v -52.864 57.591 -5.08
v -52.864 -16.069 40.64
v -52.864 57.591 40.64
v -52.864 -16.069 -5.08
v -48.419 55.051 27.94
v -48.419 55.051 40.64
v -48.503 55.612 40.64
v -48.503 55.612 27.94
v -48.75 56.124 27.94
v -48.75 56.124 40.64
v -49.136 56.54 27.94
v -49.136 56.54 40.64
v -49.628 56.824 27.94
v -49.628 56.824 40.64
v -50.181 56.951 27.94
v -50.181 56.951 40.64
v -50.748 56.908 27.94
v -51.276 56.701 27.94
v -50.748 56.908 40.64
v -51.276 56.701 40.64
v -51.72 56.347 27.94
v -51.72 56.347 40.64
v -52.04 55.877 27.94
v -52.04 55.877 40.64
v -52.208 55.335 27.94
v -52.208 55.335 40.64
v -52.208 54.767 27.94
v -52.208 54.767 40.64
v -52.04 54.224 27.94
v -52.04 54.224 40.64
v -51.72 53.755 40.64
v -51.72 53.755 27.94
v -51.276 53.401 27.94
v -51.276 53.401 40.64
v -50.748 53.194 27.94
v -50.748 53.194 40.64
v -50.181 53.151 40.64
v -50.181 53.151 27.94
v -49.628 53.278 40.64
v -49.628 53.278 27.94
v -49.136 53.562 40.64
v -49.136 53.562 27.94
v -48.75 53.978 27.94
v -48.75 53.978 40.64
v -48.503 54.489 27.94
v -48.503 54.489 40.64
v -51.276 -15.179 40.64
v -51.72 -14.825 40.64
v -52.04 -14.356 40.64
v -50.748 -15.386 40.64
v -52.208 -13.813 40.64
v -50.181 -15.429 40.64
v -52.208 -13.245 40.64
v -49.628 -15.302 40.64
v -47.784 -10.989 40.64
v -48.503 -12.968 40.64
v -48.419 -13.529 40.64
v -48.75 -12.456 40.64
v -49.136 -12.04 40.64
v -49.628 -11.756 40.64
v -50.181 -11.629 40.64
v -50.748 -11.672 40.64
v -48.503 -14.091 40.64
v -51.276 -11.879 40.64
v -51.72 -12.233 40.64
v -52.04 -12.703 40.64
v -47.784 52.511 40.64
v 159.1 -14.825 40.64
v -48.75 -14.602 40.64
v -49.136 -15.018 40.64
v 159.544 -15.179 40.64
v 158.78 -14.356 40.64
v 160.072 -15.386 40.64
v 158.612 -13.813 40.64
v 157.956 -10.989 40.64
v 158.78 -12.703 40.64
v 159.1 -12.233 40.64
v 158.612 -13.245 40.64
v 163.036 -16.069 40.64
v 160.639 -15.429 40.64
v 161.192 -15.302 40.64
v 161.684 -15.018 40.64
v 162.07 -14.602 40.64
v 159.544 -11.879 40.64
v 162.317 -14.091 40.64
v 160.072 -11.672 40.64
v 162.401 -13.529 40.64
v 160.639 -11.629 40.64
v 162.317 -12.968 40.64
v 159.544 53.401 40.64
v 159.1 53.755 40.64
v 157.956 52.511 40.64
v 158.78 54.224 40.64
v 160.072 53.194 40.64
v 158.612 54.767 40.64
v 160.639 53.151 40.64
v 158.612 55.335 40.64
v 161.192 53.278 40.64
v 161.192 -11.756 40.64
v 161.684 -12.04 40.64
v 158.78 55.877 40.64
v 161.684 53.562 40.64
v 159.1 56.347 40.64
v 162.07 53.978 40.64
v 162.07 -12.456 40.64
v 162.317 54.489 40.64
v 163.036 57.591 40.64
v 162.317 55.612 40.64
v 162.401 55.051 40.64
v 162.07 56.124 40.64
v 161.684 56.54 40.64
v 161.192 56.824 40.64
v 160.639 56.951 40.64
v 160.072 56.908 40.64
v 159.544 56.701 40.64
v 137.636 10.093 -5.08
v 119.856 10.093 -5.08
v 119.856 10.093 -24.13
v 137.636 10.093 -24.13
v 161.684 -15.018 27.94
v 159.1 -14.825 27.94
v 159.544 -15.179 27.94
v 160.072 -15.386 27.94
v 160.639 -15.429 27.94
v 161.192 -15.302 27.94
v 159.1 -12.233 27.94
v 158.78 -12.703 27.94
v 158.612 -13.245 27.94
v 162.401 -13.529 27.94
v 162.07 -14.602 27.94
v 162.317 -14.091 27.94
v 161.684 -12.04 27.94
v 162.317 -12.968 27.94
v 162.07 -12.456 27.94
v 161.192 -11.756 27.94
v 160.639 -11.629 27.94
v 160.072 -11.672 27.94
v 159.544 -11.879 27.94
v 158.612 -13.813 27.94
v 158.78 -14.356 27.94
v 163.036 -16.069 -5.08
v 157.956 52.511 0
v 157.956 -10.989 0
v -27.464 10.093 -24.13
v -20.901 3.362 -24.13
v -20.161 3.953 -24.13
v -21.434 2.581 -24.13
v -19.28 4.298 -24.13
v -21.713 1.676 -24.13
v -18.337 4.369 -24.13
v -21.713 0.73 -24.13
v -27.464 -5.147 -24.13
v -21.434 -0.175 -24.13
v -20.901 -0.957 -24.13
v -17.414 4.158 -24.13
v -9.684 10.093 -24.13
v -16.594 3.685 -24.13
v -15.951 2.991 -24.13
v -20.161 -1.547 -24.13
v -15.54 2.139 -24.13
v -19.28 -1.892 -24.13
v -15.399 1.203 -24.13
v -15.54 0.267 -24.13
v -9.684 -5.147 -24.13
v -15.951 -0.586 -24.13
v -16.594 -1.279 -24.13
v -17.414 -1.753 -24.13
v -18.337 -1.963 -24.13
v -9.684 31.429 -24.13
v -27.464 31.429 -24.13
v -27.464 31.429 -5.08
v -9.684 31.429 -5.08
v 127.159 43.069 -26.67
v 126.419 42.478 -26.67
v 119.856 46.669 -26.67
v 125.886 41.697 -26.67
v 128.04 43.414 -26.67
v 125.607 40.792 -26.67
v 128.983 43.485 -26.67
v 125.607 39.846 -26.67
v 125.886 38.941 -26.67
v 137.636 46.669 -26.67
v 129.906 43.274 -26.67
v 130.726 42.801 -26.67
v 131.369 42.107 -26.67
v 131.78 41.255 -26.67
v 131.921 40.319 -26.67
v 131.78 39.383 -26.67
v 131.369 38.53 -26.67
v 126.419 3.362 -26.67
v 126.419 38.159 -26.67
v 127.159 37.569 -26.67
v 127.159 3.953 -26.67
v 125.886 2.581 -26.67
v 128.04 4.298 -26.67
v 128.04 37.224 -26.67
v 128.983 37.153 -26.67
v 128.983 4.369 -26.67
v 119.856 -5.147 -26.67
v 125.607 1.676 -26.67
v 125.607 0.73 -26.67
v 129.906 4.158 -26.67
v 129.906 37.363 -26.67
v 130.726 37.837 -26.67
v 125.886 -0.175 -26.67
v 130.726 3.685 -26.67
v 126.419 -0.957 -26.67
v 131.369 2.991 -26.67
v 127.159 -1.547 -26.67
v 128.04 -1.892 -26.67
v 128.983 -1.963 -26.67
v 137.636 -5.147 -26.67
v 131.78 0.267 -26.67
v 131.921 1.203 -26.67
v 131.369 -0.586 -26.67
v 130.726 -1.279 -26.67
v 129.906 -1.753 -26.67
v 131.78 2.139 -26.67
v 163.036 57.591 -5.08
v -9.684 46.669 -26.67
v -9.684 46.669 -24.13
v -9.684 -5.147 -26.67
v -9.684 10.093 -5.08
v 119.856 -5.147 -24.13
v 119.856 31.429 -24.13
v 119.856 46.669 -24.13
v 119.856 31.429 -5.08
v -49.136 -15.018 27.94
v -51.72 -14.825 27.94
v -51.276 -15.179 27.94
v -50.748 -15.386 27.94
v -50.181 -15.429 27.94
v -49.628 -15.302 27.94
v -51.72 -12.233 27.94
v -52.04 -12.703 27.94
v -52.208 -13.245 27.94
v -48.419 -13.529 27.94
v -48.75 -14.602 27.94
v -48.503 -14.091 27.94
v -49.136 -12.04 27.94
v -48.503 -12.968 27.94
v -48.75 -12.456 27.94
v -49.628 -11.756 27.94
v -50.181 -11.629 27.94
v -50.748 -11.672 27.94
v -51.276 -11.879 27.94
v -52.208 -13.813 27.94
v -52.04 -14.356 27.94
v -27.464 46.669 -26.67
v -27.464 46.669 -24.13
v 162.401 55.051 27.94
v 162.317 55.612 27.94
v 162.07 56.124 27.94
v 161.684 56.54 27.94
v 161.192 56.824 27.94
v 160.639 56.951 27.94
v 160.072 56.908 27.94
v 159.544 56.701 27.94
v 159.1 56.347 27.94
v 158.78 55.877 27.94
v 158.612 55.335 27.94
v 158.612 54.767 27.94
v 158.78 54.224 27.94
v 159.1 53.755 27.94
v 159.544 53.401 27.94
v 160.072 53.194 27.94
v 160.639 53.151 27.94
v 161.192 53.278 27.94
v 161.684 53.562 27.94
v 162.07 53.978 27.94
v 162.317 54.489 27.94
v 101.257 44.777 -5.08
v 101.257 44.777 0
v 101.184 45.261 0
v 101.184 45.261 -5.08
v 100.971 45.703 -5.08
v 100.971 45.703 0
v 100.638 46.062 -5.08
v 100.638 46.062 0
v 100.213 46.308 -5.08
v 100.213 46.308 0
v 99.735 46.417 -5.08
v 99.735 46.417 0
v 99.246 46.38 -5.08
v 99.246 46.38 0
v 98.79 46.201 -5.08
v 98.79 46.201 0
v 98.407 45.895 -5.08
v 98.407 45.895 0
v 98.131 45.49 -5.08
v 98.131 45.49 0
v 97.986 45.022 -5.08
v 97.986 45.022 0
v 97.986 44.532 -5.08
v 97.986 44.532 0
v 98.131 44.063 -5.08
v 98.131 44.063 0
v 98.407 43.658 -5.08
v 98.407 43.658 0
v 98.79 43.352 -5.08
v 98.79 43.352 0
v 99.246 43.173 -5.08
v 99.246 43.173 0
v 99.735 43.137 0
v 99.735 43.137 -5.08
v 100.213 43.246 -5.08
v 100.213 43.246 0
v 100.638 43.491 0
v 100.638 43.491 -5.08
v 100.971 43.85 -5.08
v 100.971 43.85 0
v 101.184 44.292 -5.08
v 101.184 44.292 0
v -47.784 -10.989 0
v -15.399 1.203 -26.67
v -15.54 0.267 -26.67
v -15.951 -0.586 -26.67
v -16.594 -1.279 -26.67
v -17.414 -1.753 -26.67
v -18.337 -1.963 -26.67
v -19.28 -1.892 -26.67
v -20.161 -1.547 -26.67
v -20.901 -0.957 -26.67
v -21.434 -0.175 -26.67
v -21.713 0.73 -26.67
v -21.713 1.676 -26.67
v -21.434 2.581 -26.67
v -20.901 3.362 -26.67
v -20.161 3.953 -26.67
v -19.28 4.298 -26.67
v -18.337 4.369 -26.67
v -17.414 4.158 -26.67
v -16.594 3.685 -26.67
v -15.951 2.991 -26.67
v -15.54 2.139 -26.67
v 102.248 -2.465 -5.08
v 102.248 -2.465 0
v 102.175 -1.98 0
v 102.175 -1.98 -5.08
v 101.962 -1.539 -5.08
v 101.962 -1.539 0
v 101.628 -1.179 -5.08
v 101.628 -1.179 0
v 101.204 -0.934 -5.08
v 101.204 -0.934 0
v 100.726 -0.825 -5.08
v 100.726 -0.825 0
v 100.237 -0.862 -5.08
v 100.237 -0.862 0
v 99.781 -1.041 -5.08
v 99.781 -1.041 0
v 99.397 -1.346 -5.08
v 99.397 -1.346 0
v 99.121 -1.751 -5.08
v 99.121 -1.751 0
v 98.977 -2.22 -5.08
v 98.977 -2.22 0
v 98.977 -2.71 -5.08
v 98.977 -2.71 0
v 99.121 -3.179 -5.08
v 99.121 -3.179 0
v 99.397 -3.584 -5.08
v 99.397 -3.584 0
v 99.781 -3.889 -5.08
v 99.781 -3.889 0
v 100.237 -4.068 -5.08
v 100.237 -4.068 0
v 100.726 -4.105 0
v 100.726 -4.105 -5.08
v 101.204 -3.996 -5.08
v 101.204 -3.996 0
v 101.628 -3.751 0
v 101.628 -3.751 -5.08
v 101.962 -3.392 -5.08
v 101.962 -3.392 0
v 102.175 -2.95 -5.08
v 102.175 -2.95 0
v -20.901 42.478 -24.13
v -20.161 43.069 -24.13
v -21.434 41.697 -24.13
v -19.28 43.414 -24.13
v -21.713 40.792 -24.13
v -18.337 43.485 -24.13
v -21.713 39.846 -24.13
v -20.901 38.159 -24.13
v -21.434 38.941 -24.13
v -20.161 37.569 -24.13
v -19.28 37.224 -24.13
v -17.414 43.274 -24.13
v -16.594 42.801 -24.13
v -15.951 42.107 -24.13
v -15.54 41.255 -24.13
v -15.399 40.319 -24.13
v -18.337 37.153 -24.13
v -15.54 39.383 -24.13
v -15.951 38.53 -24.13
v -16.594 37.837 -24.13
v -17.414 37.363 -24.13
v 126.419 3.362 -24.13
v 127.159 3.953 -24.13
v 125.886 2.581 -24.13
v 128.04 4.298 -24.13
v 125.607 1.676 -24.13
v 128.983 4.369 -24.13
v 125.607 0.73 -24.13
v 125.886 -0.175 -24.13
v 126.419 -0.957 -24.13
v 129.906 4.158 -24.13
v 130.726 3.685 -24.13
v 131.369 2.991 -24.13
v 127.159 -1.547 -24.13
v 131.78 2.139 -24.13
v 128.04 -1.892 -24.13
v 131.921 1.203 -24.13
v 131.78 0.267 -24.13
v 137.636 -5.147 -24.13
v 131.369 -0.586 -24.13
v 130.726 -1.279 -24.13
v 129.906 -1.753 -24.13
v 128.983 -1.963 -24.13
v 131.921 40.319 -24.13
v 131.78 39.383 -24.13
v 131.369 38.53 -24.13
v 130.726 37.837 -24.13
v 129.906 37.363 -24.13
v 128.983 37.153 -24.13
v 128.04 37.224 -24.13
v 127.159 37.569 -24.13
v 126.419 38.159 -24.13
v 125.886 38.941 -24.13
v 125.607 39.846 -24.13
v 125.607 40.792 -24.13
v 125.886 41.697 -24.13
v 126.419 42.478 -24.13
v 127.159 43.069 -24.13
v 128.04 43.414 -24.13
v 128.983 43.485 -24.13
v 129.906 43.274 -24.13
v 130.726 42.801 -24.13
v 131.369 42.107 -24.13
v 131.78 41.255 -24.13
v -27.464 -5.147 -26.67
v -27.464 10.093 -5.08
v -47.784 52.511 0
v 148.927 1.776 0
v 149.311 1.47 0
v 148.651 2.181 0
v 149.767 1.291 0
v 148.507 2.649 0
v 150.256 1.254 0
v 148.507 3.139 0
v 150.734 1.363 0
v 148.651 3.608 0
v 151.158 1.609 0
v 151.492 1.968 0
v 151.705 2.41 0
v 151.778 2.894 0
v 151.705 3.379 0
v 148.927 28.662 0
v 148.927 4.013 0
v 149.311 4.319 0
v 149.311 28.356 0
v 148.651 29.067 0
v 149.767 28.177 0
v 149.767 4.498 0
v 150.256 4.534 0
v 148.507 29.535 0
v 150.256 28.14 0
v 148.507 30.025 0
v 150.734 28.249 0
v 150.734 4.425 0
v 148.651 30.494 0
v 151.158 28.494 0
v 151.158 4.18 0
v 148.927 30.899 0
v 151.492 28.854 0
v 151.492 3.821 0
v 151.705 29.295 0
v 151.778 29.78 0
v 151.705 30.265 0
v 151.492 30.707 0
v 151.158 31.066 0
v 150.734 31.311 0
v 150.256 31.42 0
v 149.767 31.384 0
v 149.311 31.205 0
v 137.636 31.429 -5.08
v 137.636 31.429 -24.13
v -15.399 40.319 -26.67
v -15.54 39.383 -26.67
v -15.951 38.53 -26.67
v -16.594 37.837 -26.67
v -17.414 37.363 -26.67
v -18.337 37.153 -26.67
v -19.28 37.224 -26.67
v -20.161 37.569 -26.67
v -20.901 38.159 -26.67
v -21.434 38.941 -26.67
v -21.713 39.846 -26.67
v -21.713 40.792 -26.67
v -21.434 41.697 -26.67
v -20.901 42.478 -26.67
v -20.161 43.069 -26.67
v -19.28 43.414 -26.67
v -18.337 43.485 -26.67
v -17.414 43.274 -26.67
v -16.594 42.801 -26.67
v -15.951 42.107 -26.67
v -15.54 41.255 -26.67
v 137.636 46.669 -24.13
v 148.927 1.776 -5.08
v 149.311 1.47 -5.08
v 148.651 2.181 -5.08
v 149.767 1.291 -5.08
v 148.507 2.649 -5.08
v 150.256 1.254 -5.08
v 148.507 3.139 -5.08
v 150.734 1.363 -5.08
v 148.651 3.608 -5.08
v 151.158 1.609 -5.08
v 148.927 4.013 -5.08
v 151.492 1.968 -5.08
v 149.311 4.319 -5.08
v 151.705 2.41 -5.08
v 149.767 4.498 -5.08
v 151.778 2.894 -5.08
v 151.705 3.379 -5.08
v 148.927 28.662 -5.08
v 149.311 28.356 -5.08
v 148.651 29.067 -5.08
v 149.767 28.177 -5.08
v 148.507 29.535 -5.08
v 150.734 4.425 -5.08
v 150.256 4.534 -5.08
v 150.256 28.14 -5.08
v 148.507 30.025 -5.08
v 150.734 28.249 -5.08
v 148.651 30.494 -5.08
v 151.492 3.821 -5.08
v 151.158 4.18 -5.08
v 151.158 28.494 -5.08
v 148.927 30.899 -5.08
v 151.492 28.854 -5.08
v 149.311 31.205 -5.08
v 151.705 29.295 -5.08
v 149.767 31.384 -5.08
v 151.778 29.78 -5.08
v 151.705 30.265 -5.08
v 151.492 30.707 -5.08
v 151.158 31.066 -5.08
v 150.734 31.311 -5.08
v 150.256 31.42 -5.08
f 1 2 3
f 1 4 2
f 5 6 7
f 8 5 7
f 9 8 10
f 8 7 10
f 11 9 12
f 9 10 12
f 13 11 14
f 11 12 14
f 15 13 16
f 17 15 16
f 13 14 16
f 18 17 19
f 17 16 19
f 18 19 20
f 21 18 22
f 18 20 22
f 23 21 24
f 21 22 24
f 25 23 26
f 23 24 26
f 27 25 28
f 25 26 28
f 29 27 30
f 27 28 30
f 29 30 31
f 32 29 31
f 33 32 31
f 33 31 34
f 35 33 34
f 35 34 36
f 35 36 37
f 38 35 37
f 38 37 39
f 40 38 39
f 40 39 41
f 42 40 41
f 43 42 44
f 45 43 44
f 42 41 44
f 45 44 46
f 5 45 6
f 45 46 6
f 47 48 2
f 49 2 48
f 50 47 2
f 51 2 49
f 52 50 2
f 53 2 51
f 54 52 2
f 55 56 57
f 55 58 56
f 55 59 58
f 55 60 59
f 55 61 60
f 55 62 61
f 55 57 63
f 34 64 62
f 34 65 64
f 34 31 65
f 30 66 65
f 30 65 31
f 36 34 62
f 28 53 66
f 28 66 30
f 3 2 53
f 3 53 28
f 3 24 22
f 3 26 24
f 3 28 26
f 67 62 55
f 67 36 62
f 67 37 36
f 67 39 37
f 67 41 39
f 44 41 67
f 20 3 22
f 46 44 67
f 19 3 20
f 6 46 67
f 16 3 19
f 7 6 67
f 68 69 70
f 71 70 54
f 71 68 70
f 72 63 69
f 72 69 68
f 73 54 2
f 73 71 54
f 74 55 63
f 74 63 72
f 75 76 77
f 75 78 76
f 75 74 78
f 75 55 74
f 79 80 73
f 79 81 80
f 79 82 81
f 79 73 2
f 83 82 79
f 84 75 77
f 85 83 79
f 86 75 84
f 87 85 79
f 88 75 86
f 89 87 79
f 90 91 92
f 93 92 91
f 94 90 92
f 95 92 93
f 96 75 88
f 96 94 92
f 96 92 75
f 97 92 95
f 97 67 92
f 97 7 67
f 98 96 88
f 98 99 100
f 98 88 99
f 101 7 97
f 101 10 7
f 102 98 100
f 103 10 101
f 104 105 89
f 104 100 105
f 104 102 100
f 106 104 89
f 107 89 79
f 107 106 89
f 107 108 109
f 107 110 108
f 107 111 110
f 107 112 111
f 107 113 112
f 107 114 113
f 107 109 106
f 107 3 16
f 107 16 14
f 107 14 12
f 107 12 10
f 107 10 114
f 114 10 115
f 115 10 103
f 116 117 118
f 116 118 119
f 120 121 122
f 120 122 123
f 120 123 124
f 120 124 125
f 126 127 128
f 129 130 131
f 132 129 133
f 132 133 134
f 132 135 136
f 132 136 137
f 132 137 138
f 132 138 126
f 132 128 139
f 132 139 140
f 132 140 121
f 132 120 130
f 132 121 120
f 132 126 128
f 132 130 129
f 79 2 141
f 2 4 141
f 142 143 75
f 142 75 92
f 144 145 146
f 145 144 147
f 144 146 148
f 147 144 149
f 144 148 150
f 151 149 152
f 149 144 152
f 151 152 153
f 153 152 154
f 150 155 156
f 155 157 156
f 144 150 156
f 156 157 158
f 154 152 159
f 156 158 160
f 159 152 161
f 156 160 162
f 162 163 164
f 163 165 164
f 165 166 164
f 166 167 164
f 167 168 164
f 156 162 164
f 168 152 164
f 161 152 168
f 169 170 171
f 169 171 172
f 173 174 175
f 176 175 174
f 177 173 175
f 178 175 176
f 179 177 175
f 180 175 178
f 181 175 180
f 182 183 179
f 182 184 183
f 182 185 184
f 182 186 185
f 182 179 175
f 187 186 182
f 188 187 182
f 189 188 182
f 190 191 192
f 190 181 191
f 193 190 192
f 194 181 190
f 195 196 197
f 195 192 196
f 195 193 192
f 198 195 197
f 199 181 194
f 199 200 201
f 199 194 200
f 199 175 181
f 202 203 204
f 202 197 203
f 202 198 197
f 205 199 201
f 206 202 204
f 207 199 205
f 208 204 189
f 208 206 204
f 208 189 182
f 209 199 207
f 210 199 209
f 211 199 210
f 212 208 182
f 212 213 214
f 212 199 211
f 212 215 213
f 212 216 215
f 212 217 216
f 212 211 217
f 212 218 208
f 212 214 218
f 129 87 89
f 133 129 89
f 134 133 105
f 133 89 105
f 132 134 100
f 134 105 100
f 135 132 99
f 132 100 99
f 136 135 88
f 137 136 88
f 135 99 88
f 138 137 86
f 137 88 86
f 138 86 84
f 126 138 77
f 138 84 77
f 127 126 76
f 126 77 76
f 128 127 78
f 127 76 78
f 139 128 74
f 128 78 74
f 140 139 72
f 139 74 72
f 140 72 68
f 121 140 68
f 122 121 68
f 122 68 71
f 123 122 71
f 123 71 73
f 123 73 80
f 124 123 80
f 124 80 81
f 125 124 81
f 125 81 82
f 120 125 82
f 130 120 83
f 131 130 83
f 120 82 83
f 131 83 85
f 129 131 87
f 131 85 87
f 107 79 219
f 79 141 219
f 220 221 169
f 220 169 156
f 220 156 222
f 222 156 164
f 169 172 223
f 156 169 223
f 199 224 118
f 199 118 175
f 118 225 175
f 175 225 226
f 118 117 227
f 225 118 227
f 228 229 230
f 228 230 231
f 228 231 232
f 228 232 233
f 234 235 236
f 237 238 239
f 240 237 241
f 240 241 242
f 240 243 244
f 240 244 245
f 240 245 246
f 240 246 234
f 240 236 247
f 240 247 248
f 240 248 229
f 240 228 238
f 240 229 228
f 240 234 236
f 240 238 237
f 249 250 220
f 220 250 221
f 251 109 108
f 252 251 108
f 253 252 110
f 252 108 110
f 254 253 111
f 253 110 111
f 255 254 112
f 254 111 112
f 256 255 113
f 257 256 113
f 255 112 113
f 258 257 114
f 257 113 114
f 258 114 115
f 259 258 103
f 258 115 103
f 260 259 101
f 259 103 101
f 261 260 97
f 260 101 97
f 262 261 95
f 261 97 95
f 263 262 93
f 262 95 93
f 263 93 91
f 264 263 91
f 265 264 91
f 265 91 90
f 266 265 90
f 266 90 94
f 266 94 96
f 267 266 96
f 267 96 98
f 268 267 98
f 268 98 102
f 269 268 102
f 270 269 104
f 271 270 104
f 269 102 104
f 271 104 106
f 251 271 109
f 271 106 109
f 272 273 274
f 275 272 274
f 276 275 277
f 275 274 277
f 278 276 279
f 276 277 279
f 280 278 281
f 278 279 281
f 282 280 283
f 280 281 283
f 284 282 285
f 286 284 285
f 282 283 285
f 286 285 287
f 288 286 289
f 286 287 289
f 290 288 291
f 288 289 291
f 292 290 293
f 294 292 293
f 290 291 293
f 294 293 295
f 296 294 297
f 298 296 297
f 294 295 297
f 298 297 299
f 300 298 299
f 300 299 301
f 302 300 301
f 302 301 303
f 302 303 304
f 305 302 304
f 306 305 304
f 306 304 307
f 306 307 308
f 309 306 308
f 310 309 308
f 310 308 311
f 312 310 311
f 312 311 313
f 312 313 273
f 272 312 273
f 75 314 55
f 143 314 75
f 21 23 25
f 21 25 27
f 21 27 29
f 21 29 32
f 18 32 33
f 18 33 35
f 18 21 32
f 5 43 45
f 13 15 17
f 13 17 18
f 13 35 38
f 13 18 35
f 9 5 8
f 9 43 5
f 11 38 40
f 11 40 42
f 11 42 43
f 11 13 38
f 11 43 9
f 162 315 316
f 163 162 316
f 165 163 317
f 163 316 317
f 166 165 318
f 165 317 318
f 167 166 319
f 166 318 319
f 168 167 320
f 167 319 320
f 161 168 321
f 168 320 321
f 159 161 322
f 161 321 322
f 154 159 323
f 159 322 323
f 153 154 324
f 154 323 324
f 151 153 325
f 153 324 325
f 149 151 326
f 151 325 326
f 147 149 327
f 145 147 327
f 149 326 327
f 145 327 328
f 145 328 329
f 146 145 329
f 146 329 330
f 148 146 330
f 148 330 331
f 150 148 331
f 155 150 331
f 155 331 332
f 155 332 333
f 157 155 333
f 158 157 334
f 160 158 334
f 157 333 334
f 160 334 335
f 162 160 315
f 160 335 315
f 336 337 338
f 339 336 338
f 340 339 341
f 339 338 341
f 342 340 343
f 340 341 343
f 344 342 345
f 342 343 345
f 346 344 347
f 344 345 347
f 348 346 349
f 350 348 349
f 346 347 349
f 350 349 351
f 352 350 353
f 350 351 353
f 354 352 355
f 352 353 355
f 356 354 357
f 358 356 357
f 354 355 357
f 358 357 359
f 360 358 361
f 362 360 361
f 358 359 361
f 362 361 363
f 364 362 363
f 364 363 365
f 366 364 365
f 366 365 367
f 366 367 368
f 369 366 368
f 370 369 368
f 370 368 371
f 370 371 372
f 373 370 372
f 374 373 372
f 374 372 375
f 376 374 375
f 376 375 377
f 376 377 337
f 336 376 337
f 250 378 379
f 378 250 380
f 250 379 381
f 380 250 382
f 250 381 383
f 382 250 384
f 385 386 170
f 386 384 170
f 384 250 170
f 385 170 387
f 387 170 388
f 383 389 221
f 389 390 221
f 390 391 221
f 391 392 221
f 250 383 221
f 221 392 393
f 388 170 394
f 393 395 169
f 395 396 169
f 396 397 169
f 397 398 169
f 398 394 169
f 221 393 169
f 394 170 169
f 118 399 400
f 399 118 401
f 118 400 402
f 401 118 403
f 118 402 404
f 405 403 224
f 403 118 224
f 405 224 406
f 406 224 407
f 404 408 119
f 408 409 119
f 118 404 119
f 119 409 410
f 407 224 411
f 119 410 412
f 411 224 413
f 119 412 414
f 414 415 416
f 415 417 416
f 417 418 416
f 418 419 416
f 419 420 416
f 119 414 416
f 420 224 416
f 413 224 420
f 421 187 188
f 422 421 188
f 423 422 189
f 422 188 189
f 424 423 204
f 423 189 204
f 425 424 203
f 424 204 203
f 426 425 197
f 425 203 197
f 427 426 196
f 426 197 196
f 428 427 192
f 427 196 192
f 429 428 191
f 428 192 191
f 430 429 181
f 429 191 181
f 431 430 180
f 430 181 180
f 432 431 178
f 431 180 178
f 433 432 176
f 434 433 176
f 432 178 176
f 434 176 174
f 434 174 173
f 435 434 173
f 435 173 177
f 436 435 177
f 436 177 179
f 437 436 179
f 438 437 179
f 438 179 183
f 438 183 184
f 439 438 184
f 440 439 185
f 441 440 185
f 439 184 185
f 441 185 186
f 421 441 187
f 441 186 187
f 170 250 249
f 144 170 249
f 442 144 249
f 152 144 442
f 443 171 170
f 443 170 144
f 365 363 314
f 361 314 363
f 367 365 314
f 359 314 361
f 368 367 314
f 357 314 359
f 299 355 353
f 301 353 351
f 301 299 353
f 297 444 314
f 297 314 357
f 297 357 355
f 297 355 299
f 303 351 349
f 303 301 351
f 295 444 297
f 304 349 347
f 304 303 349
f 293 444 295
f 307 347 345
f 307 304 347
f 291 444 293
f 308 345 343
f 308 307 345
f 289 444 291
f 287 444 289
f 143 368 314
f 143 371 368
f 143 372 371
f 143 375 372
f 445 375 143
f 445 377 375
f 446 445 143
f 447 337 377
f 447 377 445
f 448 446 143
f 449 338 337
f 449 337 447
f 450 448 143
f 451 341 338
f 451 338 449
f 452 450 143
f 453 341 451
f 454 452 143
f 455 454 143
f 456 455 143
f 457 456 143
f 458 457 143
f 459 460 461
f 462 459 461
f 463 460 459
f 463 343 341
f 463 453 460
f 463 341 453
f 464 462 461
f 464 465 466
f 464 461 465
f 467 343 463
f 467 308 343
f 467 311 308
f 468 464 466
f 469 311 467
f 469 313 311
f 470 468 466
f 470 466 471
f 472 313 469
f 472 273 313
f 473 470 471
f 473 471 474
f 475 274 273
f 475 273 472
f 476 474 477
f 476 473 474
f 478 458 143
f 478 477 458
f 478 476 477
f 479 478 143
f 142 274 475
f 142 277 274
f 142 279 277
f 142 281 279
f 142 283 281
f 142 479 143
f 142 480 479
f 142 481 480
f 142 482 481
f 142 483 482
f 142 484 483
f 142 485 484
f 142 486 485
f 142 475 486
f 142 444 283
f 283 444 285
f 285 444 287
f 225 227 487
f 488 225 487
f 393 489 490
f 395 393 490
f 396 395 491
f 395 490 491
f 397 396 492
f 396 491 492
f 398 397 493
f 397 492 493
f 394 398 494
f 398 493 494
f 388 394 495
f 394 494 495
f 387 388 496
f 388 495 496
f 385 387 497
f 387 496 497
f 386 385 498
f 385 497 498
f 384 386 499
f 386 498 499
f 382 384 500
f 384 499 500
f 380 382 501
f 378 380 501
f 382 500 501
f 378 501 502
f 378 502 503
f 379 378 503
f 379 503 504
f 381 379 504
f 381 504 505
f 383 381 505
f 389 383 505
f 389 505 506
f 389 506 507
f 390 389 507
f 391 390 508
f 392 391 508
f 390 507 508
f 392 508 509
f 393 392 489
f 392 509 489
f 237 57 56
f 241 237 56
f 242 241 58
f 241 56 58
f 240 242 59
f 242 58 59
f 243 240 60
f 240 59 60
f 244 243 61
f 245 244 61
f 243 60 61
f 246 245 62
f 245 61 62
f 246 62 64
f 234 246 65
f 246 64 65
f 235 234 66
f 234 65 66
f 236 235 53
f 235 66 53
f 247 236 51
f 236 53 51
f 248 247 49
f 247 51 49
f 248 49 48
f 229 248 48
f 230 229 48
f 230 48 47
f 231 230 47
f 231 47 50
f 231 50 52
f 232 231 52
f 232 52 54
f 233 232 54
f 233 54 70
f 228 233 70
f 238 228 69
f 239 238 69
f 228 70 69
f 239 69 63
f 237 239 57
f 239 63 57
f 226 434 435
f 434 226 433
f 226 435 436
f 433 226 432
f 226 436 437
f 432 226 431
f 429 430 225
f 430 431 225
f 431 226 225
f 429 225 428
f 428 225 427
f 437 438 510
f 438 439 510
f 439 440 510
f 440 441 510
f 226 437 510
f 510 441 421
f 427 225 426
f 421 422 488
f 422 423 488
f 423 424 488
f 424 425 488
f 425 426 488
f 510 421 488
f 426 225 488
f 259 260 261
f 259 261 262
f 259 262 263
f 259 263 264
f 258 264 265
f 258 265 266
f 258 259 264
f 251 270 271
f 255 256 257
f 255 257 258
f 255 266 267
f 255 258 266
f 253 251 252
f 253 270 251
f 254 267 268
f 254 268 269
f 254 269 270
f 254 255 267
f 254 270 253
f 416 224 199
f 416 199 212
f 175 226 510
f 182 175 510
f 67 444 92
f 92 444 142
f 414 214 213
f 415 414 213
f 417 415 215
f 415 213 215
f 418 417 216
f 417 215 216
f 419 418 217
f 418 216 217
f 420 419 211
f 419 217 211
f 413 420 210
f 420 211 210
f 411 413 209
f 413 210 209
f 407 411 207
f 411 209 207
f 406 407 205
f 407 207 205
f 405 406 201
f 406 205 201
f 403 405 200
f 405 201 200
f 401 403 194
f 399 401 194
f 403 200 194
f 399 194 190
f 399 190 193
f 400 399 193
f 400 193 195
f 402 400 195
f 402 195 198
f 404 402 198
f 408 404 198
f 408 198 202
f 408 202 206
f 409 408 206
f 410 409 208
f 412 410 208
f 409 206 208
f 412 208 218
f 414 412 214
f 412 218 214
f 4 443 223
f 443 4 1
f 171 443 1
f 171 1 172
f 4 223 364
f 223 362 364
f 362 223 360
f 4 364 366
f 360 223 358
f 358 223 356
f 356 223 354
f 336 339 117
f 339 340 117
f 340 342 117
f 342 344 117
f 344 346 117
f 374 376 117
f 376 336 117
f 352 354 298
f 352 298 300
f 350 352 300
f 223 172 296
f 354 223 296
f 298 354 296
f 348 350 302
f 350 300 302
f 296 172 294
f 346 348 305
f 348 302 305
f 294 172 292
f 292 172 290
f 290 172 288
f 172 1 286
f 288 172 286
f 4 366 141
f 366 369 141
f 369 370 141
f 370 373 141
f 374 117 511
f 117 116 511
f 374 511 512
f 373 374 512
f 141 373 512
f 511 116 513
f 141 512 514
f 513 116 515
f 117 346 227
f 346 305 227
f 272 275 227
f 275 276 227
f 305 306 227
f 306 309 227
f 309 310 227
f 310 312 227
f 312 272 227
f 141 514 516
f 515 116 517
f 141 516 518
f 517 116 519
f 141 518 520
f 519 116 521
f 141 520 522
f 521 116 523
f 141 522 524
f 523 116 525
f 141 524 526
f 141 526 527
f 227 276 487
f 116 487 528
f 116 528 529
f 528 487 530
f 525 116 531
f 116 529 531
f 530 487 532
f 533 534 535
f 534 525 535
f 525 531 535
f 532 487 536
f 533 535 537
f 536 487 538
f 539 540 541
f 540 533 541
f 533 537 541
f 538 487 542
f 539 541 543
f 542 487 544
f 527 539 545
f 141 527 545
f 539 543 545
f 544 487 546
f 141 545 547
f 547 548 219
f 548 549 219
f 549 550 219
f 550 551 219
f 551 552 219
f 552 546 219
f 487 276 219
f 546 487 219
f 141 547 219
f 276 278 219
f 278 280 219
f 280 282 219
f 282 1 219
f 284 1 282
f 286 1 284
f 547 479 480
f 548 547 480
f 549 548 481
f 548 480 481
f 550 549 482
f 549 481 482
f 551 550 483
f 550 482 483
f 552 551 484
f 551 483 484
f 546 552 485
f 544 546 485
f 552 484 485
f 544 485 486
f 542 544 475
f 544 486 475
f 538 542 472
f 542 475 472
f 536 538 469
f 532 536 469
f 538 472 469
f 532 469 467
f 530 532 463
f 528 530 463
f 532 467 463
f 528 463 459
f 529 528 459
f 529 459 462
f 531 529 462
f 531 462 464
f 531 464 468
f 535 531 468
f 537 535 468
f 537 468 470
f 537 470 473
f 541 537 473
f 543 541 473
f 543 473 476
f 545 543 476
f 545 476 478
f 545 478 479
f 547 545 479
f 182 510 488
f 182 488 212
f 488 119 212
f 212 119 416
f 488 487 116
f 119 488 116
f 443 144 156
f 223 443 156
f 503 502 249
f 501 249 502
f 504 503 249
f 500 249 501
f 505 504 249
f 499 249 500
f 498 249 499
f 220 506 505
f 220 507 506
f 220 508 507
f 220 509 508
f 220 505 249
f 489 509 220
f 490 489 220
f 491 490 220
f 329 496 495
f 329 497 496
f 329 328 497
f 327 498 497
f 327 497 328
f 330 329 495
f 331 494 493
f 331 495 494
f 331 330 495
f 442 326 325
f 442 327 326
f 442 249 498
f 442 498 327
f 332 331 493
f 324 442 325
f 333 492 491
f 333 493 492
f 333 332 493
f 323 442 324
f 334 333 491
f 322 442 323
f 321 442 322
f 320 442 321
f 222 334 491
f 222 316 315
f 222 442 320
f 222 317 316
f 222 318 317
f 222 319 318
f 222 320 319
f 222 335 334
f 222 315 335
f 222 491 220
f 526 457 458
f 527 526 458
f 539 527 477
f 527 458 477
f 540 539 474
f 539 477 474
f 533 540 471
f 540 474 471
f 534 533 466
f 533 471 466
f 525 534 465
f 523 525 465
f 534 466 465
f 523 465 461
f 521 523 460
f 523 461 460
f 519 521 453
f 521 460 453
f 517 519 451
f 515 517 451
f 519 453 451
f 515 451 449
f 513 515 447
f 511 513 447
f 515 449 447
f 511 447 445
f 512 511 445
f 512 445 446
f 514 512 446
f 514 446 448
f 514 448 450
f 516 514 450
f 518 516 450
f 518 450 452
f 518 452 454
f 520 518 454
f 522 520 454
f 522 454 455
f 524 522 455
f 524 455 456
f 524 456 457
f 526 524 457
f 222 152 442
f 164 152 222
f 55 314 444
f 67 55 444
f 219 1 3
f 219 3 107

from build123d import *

# Parameters (mm, degrees)
F0_W      = 215.9
F0_H      = 73.66
F0_W_2    = 205.74
F0_H_2    = 63.5
F1_DEPTH  = 5.08
F2_DEPTH  = 40.64
F3_R      = 1.64465
F4_DEPTH  = 5.081
F5_R      = 1.905
F6_DEPTH  = 12.7
F7_W      = 17.78
F7_H      = 21.336
F8_DEPTH  = 19.05
F9_W      = 17.78
F9_H      = 15.24
F9_H_2    = 21.336
F9_H_3    = 51.816
F10_DEPTH = 2.54
F11_R     = 3.175
F12_DEPTH = 2.54


with BuildPart() as f1:
    # F0 (on Top) → F1 (new body)
    with BuildSketch(Plane.XY):
        with Locations((55.0861711621, 20.7609453964)):
            Rectangle(F0_W, F0_H)
        with Locations((55.0861711621, 20.7609453964)):
            Rectangle(F0_W_2, F0_H_2, mode=Mode.SUBTRACT)
        with Locations((55.0861711621, 20.7609453964)):
            Rectangle(F0_W_2, F0_H_2)
    extrude(amount=-F1_DEPTH)

    # F0 (on Top) → F2 (join)
    with BuildSketch(Plane.XY):
        with Locations((55.0861711621, 20.7609453964)):
            Rectangle(F0_W, F0_H)
        with Locations((55.0861711621, 20.7609453964)):
            Rectangle(F0_W_2, F0_H_2, mode=Mode.SUBTRACT)
    extrude(amount=F2_DEPTH)

    # F3 (on face) → F4 (cut, through all)
    with BuildSketch(Plane.XY):
        with Locations((150.1329711621, 29.7802567964)):
            Circle(F3_R)
        with Locations((150.1329711621, 2.8943567964)):
            Circle(F3_R)
        with Locations((100.6029711621, -2.4650432036)):
            Circle(F3_R)
        with Locations((99.6123711621, 44.7766453964)):
            Circle(F3_R)
    extrude(amount=-F4_DEPTH, mode=Mode.SUBTRACT)

    # F5 (on face) → F6 (cut)
    with BuildSketch(Plane.XY.offset(40.64)):
        with Locations((160.4961711621, -13.5290546036)):
            Circle(F5_R)
        with Locations((160.4961711621, 55.0509453964)):
            Circle(F5_R)
        with Locations((-50.3238288379, 55.0509453964)):
            Circle(F5_R)
        with Locations((-50.3238288379, -13.5290546036)):
            Circle(F5_R)
    extrude(amount=-F6_DEPTH, mode=Mode.SUBTRACT)

    # F7 (on face) → F8 (join)
    with BuildSketch(Plane(origin=(0, 0, -5.08), x_dir=(1, 0, 0), z_dir=(0, 0, -1))):
        with Locations((128.7461711621, -20.7609453964)):
            Rectangle(F7_W, F7_H)
        with Locations((-18.5738288379, -20.7609453964)):
            Rectangle(F7_W, F7_H)
    extrude(amount=F8_DEPTH)

    # F9 (on face) → F10 (join)
    with BuildSketch(Plane(origin=(0, 0, -24.13), x_dir=(1, 0, 0), z_dir=(0, 0, -1))):
        with Locations((128.7461711621, -39.0489453964)):
            Rectangle(F9_W, F9_H)
        with Locations((128.7461711621, -20.7609453964)):
            Rectangle(F9_W, F9_H_2)
        with Locations((128.7461711621, -2.4729453964)):
            Rectangle(F9_W, F9_H)
        with Locations((-18.5738288379, -20.7609453964)):
            Rectangle(F9_W, F9_H_3)
    extrude(amount=F10_DEPTH)

    # F11 (on face) → F12 (cut, through all)
    with BuildSketch(Plane(origin=(0, 0, -26.67), x_dir=(1, 0, 0), z_dir=(0, 0, -1))):
        with Locations((-18.5738288379, -1.2029453964)):
            Circle(F11_R)
        with Locations((-18.5738288379, -40.3189453964)):
            Circle(F11_R)
        with Locations((128.7461711621, -40.3189453964)):
            Circle(F11_R)
        with Locations((128.7461711621, -1.2029453964)):
            Circle(F11_R)
    extrude(amount=-F12_DEPTH, mode=Mode.SUBTRACT)


solid = f1.part
